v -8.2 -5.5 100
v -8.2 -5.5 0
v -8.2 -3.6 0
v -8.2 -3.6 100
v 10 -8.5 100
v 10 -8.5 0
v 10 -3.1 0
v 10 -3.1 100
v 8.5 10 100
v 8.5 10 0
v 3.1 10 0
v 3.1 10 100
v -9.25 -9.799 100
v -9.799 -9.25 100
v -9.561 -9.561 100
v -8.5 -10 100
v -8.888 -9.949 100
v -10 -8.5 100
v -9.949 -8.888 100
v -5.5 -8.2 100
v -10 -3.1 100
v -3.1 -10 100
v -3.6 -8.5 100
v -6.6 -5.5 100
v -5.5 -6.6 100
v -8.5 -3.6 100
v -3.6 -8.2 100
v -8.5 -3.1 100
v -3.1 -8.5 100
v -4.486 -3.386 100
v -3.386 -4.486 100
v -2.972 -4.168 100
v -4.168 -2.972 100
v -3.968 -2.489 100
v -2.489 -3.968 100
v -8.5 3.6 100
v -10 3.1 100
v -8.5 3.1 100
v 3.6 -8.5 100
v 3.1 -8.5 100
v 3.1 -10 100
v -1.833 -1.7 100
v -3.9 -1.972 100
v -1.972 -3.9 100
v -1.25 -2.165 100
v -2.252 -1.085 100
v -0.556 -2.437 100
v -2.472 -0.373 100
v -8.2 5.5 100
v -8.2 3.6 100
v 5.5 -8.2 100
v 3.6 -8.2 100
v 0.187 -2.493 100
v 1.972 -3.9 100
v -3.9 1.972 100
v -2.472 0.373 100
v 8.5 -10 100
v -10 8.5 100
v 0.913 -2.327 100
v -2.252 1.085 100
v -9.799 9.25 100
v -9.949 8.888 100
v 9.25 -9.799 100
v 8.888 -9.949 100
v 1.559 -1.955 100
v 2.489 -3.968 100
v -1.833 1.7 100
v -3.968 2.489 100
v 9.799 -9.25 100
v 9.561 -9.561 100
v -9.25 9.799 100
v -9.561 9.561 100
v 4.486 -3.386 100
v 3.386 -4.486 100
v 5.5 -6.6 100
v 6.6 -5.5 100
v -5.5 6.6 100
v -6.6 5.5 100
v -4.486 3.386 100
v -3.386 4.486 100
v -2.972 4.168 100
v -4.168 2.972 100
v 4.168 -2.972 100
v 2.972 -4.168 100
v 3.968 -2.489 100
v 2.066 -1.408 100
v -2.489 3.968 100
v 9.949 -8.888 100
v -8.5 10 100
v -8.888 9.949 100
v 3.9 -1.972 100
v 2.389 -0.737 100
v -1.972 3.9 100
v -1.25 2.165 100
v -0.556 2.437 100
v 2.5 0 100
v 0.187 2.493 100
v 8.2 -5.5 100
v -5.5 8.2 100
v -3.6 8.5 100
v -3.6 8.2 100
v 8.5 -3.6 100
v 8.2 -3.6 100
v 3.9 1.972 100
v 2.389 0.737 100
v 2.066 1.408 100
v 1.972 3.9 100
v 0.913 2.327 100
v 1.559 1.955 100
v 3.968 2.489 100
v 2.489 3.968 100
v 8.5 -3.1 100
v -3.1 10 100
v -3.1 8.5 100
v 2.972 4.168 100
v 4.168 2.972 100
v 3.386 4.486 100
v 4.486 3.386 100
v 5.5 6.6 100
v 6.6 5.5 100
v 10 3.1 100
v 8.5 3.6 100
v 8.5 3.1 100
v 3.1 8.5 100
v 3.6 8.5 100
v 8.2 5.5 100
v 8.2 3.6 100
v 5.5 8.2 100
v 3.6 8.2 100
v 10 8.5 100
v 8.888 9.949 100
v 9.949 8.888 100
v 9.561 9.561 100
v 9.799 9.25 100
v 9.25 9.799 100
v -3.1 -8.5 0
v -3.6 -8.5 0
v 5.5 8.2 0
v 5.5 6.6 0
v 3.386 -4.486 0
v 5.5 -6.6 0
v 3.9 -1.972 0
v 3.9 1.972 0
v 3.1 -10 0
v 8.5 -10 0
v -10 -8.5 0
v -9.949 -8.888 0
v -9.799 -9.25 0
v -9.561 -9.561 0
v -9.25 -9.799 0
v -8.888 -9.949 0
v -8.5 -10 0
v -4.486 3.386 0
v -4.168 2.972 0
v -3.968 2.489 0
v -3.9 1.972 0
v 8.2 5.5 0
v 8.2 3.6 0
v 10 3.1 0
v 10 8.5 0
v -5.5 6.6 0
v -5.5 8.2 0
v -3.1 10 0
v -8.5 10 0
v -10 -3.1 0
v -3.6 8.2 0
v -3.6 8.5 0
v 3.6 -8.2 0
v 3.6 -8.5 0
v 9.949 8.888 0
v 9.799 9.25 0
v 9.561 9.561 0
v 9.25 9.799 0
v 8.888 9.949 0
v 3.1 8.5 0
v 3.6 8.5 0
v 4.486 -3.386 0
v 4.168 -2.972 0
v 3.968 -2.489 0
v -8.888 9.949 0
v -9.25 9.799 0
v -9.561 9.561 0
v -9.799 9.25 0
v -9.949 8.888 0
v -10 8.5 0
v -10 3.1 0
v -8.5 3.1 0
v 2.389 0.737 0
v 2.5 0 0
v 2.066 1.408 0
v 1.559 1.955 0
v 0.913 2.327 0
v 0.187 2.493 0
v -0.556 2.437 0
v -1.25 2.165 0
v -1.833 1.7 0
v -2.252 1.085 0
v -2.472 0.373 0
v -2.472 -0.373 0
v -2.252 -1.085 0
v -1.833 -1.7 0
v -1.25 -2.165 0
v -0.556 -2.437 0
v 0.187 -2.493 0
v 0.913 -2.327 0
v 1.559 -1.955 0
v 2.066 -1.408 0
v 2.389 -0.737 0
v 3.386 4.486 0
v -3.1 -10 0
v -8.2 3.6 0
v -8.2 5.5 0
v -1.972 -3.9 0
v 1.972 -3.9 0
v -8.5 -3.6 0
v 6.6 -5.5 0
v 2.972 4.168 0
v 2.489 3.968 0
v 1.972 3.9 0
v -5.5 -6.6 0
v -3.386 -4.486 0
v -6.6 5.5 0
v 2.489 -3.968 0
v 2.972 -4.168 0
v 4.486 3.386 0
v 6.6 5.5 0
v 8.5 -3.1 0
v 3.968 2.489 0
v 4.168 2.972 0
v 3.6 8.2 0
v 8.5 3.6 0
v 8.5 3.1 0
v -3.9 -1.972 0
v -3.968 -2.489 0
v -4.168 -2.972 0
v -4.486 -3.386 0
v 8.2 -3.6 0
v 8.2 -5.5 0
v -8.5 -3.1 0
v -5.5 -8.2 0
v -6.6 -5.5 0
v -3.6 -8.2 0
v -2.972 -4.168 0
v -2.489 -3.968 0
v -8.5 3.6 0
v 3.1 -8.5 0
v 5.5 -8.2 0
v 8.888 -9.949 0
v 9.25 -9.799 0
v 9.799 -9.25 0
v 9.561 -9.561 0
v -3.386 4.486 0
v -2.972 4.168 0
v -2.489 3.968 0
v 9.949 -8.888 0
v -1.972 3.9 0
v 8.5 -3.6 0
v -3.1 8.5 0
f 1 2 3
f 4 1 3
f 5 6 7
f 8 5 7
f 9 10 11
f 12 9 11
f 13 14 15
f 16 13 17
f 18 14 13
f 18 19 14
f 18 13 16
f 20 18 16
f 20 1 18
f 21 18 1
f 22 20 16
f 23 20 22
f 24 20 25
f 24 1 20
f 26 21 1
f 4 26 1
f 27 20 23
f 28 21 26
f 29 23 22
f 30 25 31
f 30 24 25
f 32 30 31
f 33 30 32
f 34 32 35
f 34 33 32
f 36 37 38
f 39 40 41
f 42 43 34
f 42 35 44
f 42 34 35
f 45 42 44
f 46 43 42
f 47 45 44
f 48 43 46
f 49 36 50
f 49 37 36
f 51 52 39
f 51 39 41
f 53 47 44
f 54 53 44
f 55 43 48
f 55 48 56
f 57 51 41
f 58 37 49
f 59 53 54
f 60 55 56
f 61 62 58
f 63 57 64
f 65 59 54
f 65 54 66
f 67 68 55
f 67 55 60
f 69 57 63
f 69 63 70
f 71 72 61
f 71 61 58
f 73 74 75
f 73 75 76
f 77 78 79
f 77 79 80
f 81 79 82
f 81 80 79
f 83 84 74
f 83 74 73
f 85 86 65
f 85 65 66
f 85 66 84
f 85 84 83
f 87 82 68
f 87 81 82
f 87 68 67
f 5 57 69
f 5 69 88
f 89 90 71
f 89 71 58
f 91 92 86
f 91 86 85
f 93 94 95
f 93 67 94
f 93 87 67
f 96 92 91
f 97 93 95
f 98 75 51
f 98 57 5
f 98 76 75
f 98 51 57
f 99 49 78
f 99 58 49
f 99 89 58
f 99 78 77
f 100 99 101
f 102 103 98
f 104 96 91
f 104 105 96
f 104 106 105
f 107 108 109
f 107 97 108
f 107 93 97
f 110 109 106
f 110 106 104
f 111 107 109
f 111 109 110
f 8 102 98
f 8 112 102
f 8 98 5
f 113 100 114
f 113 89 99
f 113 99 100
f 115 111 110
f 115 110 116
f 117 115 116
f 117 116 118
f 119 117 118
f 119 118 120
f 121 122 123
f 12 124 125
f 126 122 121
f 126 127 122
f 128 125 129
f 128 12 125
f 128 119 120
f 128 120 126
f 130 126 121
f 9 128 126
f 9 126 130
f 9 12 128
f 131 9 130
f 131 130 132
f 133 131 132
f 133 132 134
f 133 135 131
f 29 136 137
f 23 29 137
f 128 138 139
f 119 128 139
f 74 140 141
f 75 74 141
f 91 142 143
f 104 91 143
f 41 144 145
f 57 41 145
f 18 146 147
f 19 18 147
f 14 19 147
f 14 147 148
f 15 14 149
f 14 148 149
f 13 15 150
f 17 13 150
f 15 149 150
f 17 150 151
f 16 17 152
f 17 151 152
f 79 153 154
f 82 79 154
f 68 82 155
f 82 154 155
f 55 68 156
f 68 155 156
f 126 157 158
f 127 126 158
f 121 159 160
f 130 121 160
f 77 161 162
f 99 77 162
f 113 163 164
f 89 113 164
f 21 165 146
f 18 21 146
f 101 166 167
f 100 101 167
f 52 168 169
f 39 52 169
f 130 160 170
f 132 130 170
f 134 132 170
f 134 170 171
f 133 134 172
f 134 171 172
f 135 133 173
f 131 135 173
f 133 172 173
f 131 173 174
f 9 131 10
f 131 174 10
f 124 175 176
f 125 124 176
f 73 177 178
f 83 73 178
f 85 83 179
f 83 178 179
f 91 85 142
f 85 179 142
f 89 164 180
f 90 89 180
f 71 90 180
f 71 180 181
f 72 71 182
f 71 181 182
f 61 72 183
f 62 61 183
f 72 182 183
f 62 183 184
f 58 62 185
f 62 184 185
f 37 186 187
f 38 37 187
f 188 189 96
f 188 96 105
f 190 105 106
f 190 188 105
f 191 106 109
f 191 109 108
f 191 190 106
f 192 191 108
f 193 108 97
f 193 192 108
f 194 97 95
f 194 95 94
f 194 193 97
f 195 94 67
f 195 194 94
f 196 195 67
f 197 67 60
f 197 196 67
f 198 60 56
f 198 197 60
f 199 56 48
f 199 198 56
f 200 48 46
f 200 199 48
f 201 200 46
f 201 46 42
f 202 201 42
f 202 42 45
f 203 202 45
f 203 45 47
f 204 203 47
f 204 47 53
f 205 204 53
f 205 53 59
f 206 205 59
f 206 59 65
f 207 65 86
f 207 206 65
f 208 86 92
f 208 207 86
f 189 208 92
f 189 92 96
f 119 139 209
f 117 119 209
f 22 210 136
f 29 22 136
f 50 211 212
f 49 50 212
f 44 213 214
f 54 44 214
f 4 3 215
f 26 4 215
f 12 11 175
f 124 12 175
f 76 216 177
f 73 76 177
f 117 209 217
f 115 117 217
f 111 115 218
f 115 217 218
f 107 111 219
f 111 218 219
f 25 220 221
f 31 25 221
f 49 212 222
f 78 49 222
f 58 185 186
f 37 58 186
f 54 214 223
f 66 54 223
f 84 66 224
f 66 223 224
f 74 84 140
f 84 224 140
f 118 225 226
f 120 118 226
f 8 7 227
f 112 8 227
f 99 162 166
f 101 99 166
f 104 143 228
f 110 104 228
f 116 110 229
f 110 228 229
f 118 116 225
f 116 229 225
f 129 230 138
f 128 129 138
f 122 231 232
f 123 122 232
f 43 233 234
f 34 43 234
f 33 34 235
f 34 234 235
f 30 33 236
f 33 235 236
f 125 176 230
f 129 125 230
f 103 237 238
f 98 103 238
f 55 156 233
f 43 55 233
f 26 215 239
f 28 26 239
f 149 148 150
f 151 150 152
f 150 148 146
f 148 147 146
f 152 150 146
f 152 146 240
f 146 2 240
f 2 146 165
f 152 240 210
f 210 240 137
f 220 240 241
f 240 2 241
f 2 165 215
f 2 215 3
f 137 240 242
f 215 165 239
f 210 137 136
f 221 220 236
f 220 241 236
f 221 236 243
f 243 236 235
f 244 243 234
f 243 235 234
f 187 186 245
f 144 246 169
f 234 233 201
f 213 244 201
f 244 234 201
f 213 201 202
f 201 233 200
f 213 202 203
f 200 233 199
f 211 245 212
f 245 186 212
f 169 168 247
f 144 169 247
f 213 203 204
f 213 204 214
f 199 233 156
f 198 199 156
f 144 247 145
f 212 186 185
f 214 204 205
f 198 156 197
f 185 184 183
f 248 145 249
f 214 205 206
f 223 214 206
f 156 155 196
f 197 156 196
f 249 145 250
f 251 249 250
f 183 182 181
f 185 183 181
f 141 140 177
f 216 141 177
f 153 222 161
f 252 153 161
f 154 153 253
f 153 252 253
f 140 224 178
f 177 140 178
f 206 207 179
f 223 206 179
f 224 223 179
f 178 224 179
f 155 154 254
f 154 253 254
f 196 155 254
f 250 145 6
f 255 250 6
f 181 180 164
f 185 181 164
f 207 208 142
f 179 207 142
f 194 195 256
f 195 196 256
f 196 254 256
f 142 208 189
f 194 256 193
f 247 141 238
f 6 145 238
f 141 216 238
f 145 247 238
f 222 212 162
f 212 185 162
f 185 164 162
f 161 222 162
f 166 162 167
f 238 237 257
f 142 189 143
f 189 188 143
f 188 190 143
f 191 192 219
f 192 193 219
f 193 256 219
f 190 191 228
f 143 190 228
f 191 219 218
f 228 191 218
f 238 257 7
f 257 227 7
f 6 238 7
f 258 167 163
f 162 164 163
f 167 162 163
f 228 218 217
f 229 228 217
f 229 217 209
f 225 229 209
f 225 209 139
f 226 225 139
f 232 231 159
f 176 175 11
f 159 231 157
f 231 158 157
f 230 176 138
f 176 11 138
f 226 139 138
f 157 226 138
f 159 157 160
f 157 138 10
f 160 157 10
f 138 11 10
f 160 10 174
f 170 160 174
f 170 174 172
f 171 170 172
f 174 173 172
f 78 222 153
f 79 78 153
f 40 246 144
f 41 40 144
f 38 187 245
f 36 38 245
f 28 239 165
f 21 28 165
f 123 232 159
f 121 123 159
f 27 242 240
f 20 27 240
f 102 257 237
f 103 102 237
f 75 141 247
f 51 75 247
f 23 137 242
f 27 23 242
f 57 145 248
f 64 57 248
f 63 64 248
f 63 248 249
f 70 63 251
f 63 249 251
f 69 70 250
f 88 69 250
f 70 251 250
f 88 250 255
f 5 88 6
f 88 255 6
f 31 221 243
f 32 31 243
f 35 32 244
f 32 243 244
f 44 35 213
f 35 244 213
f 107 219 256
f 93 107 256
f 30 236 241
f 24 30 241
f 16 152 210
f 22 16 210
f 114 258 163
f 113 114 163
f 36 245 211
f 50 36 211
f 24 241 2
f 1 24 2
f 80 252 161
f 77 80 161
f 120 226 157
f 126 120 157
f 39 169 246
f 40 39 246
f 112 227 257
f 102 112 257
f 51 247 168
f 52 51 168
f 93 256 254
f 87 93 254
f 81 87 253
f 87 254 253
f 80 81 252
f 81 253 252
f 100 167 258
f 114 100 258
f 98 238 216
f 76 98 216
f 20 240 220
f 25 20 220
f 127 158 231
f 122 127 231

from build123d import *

# Parameters (mm, degrees)
SKETCH1_R           = 2.5
BOSS_EXTRUDE1_DEPTH = 100


with BuildPart() as part:
    # Sketch1 → Boss-Extrude1 (new body)
    with BuildSketch(Plane.XY):
        with BuildLine():
            Line((1.971572875, 3.9), (-1.971572875, 3.9))
            ThreePointArc((-1.971572875, 3.9), (-2.73693974, 4.052240935), (-3.385786438, 4.485786438))
            Line((-3.385786438, 4.485786438), (-5.5, 6.6))
            Line((-5.5, 6.6), (-5.5, 8.2))
            Line((-5.5, 8.2), (-3.6, 8.2))
            Line((-3.6, 8.2), (-3.6, 8.5))
            Line((-3.6, 8.5), (-3.1, 8.5))
            Line((-3.1, 8.5), (-3.1, 10))
            Line((-3.1, 10), (-8.5, 10))
            ThreePointArc((-8.5, 10), (-9.560660172, 9.560660172), (-10, 8.5))
            Line((-10, 8.5), (-10, 3.1))
            Line((-10, 3.1), (-8.5, 3.1))
            Line((-8.5, 3.1), (-8.5, 3.6))
            Line((-8.5, 3.6), (-8.2, 3.6))
            Line((-8.2, 3.6), (-8.2, 5.5))
            Line((-8.2, 5.5), (-6.6, 5.5))
            Line((-6.6, 5.5), (-4.485786438, 3.385786438))
            ThreePointArc((-4.485786438, 3.385786438), (-4.052240935, 2.73693974), (-3.9, 1.971572875))
            Line((-3.9, 1.971572875), (-3.9, -1.971572875))
            ThreePointArc((-3.9, -1.971572875), (-4.052240935, -2.73693974), (-4.485786438, -3.385786438))
            Line((-4.485786438, -3.385786438), (-6.6, -5.5))
            Line((-6.6, -5.5), (-8.2, -5.5))
            Line((-8.2, -5.5), (-8.2, -3.6))
            Line((-8.2, -3.6), (-8.5, -3.6))
            Line((-8.5, -3.6), (-8.5, -3.1))
            Line((-8.5, -3.1), (-10, -3.1))
            Line((-10, -3.1), (-10, -8.5))
            ThreePointArc((-10, -8.5), (-9.560660172, -9.560660172), (-8.5, -10))
            Line((-8.5, -10), (-3.1, -10))
            Line((-3.1, -10), (-3.1, -8.5))
            Line((-3.1, -8.5), (-3.6, -8.5))
            Line((-3.6, -8.5), (-3.6, -8.2))
            Line((-3.6, -8.2), (-5.5, -8.2))
            Line((-5.5, -8.2), (-5.5, -6.6))
            Line((-5.5, -6.6), (-3.385786438, -4.485786438))
            ThreePointArc((-3.385786438, -4.485786438), (-2.73693974, -4.052240935), (-1.971572875, -3.9))
            Line((-1.971572875, -3.9), (1.971572875, -3.9))
            ThreePointArc((1.971572875, -3.9), (2.73693974, -4.052240935), (3.385786438, -4.485786438))
            Line((3.385786438, -4.485786438), (5.5, -6.6))
            Line((5.5, -6.6), (5.5, -8.2))
            Line((5.5, -8.2), (3.6, -8.2))
            Line((3.6, -8.2), (3.6, -8.5))
            Line((3.6, -8.5), (3.1, -8.5))
            Line((3.1, -8.5), (3.1, -10))
            Line((3.1, -10), (8.5, -10))
            ThreePointArc((8.5, -10), (9.560660172, -9.560660172), (10, -8.5))
            Line((10, -8.5), (10, -3.1))
            Line((10, -3.1), (8.5, -3.1))
            Line((8.5, -3.1), (8.5, -3.6))
            Line((8.5, -3.6), (8.2, -3.6))
            Line((8.2, -3.6), (8.2, -5.5))
            Line((8.2, -5.5), (6.6, -5.5))
            Line((6.6, -5.5), (4.485786438, -3.385786438))
            ThreePointArc((4.485786438, -3.385786438), (4.052240935, -2.73693974), (3.9, -1.971572875))
            Line((3.9, -1.971572875), (3.9, 1.971572875))
            ThreePointArc((3.9, 1.971572875), (4.052240935, 2.73693974), (4.485786438, 3.385786438))
            Line((4.485786438, 3.385786438), (6.6, 5.5))
            Line((6.6, 5.5), (8.2, 5.5))
            Line((8.2, 5.5), (8.2, 3.6))
            Line((8.2, 3.6), (8.5, 3.6))
            Line((8.5, 3.6), (8.5, 3.1))
            Line((8.5, 3.1), (10, 3.1))
            Line((10, 3.1), (10, 8.5))
            ThreePointArc((10, 8.5), (9.560660172, 9.560660172), (8.5, 10))
            Line((8.5, 10), (3.1, 10))
            Line((3.1, 10), (3.1, 8.5))
            Line((3.1, 8.5), (3.6, 8.5))
            Line((3.6, 8.5), (3.6, 8.2))
            Line((3.6, 8.2), (5.5, 8.2))
            Line((5.5, 8.2), (5.5, 6.6))
            Line((5.5, 6.6), (3.385786438, 4.485786438))
            ThreePointArc((3.385786438, 4.485786438), (2.73693974, 4.052240935), (1.971572875, 3.9))
        make_face()
        Circle(SKETCH1_R, mode=Mode.SUBTRACT)
    extrude(amount=BOSS_EXTRUDE1_DEPTH)


solid = part.part
